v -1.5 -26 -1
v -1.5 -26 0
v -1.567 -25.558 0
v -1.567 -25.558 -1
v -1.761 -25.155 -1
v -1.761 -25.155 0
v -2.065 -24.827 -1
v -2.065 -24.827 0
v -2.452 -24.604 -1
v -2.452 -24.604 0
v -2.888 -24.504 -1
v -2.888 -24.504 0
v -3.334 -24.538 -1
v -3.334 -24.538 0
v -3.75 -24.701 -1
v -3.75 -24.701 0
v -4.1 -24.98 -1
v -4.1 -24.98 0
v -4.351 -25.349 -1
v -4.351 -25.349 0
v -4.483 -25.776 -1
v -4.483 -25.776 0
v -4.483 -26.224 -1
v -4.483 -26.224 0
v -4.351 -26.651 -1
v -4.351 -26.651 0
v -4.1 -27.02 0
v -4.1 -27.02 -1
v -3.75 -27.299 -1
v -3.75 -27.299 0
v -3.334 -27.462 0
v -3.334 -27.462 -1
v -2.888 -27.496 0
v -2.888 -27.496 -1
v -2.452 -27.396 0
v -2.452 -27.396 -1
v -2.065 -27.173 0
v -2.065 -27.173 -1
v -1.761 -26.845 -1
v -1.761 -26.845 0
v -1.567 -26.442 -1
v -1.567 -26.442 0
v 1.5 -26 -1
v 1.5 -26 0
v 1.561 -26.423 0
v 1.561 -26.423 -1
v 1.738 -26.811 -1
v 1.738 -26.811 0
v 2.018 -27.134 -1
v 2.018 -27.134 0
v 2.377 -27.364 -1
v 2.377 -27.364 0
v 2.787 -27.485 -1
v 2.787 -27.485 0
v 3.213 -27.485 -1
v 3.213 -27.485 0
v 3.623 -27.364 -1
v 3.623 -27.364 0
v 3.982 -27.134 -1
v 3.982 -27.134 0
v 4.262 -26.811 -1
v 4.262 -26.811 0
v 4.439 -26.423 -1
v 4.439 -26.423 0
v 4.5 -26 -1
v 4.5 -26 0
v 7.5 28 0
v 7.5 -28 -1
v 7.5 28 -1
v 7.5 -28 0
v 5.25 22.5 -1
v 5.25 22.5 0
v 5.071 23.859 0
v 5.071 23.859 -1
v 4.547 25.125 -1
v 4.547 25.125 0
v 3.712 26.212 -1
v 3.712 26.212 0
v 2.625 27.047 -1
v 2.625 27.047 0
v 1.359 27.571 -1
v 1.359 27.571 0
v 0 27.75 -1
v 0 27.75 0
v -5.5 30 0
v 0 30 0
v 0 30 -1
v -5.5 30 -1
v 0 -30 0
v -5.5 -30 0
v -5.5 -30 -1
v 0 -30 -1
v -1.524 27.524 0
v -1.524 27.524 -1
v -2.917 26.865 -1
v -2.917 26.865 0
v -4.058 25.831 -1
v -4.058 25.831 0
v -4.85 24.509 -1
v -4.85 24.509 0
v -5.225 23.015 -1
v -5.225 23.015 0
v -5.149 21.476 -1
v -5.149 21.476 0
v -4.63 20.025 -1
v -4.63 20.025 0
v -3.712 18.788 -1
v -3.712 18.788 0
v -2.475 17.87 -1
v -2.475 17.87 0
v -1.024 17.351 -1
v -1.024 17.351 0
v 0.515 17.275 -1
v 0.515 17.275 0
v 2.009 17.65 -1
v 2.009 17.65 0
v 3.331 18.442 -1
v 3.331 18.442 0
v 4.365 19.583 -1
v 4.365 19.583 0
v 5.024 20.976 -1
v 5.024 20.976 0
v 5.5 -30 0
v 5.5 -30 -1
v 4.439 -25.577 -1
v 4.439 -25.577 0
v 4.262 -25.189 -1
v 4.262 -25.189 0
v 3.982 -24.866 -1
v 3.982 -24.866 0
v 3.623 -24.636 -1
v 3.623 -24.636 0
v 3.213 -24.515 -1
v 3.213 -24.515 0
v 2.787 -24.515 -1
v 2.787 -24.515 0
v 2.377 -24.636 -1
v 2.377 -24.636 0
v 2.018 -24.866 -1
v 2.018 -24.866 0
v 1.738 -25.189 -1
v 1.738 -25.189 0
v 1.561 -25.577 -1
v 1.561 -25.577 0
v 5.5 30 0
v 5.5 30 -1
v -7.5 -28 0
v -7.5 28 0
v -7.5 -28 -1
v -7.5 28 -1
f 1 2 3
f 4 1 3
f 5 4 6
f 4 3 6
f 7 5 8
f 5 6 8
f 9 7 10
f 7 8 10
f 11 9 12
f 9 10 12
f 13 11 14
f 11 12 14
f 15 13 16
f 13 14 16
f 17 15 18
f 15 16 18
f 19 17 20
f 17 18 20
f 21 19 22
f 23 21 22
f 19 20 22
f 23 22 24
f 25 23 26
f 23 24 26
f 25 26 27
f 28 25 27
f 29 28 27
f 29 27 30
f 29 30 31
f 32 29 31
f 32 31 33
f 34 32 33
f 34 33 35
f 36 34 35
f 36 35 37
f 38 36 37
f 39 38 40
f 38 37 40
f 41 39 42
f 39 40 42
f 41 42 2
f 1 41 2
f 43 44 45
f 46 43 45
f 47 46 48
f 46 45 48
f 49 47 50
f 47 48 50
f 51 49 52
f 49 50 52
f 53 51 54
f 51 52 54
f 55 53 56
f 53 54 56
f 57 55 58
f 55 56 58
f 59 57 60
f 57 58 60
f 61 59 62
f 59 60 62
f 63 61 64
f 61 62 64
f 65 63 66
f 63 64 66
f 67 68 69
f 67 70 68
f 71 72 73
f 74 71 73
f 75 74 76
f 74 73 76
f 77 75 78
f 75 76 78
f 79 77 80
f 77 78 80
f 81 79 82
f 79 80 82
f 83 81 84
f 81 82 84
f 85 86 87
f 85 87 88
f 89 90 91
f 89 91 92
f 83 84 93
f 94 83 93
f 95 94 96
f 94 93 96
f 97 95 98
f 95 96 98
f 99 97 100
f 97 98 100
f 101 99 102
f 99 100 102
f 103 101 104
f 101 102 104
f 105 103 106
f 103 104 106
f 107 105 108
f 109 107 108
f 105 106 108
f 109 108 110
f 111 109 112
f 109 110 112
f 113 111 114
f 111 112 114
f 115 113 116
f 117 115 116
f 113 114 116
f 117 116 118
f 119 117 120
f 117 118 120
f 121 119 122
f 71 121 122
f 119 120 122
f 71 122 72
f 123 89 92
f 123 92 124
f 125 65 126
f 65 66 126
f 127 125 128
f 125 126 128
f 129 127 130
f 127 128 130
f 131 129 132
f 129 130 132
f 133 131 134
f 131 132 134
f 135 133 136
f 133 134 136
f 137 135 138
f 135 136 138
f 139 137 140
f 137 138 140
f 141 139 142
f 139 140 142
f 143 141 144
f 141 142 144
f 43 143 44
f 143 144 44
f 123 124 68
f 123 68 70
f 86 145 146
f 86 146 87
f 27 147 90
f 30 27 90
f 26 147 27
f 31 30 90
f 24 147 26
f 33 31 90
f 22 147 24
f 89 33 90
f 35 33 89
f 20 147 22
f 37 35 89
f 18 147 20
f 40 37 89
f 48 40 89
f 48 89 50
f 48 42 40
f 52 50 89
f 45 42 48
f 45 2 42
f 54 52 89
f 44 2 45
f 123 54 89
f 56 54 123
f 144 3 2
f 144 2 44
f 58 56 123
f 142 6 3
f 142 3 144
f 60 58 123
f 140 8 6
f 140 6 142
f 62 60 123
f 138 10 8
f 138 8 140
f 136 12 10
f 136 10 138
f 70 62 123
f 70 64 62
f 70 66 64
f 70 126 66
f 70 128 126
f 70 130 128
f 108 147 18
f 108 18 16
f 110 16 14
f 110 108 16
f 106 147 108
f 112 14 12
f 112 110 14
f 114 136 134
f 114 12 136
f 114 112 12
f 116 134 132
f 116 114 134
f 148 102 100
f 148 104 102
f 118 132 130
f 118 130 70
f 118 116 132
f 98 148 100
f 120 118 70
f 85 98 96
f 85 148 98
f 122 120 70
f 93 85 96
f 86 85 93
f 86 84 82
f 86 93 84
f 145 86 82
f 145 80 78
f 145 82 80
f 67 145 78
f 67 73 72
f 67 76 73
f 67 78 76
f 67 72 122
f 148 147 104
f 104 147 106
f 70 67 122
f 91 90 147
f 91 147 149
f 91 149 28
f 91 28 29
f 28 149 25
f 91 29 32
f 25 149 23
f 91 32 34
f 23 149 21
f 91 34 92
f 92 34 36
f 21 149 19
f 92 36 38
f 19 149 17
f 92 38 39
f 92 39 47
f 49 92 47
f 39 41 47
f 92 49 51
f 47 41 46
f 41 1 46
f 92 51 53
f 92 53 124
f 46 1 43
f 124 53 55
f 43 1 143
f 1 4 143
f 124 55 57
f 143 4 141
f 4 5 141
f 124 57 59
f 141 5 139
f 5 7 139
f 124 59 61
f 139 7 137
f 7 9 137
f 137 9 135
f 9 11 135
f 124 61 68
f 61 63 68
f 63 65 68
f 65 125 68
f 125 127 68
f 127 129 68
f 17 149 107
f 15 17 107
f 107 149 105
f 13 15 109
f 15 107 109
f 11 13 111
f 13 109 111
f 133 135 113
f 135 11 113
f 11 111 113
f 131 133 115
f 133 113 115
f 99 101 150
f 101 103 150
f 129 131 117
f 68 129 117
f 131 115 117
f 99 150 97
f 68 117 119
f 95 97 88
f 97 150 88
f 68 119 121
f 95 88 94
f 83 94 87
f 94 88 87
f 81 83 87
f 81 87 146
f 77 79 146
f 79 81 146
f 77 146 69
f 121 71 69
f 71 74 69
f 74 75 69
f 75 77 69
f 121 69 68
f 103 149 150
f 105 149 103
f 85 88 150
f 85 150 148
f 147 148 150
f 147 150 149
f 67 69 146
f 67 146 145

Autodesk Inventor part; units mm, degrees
ref_plane "YZ Plane" through (0, 0, 0) normal (1, 0, 0) x (0, 1, 0)
ref_plane "XZ Plane" through (0, 0, 0) normal (0, 1, 0) x (-1, 0, 0)
ref_plane "XY Plane" through (0, 0, 0) normal (0, 0, 1) x (1, 0, 0)
sketch "Sketch1" plane through (0, 0, 0) normal (0, 0, 1) x (1, 0, 0)
  line L0 (-7.5, -30) -> (7.5, -30)
  line L1 (7.5, -30) -> (7.5, 30)
  line L2 (7.5, 30) -> (-7.5, 30)
  line L3 (-7.5, 30) -> (-7.5, -30)
  line L4 (-7.5, -30) -> (7.5, 30) construction
  line L5 (7.5, -30) -> (-7.5, 30) construction
  line L6 (0, 30) -> (0, 22.5)
  circle A0 centre (0, 22.5) radius 5.25
  line L7 (0, -30) -> (0, -26)
  line L8 (-3, -26) -> (3, -26)
  circle A1 centre (-3, -26) radius 1.5
  circle A2 centre (3, -26) radius 1.5
  point P0 (0, 0)
  dimension "d0" = 15
  dimension "d1" = 60
  dimension "d2" = 7.5
  dimension "d3" = 10.5
  dimension "d6" = 4
  dimension "d7" = 6
  dimension "d8" = 3
  dimension "d9" = 3
extrude "Extrusion1" add sketch "Sketch1" against normal blind 1
chamfer "Chamfer1" distance 2 angle 45 4 edges at (7.5, 30, -0.5) (-7.5, 30, -0.5) (7.5, -30, -0.5) (-7.5, -30, -0.5)
properties part number "Loadcell_lever"
